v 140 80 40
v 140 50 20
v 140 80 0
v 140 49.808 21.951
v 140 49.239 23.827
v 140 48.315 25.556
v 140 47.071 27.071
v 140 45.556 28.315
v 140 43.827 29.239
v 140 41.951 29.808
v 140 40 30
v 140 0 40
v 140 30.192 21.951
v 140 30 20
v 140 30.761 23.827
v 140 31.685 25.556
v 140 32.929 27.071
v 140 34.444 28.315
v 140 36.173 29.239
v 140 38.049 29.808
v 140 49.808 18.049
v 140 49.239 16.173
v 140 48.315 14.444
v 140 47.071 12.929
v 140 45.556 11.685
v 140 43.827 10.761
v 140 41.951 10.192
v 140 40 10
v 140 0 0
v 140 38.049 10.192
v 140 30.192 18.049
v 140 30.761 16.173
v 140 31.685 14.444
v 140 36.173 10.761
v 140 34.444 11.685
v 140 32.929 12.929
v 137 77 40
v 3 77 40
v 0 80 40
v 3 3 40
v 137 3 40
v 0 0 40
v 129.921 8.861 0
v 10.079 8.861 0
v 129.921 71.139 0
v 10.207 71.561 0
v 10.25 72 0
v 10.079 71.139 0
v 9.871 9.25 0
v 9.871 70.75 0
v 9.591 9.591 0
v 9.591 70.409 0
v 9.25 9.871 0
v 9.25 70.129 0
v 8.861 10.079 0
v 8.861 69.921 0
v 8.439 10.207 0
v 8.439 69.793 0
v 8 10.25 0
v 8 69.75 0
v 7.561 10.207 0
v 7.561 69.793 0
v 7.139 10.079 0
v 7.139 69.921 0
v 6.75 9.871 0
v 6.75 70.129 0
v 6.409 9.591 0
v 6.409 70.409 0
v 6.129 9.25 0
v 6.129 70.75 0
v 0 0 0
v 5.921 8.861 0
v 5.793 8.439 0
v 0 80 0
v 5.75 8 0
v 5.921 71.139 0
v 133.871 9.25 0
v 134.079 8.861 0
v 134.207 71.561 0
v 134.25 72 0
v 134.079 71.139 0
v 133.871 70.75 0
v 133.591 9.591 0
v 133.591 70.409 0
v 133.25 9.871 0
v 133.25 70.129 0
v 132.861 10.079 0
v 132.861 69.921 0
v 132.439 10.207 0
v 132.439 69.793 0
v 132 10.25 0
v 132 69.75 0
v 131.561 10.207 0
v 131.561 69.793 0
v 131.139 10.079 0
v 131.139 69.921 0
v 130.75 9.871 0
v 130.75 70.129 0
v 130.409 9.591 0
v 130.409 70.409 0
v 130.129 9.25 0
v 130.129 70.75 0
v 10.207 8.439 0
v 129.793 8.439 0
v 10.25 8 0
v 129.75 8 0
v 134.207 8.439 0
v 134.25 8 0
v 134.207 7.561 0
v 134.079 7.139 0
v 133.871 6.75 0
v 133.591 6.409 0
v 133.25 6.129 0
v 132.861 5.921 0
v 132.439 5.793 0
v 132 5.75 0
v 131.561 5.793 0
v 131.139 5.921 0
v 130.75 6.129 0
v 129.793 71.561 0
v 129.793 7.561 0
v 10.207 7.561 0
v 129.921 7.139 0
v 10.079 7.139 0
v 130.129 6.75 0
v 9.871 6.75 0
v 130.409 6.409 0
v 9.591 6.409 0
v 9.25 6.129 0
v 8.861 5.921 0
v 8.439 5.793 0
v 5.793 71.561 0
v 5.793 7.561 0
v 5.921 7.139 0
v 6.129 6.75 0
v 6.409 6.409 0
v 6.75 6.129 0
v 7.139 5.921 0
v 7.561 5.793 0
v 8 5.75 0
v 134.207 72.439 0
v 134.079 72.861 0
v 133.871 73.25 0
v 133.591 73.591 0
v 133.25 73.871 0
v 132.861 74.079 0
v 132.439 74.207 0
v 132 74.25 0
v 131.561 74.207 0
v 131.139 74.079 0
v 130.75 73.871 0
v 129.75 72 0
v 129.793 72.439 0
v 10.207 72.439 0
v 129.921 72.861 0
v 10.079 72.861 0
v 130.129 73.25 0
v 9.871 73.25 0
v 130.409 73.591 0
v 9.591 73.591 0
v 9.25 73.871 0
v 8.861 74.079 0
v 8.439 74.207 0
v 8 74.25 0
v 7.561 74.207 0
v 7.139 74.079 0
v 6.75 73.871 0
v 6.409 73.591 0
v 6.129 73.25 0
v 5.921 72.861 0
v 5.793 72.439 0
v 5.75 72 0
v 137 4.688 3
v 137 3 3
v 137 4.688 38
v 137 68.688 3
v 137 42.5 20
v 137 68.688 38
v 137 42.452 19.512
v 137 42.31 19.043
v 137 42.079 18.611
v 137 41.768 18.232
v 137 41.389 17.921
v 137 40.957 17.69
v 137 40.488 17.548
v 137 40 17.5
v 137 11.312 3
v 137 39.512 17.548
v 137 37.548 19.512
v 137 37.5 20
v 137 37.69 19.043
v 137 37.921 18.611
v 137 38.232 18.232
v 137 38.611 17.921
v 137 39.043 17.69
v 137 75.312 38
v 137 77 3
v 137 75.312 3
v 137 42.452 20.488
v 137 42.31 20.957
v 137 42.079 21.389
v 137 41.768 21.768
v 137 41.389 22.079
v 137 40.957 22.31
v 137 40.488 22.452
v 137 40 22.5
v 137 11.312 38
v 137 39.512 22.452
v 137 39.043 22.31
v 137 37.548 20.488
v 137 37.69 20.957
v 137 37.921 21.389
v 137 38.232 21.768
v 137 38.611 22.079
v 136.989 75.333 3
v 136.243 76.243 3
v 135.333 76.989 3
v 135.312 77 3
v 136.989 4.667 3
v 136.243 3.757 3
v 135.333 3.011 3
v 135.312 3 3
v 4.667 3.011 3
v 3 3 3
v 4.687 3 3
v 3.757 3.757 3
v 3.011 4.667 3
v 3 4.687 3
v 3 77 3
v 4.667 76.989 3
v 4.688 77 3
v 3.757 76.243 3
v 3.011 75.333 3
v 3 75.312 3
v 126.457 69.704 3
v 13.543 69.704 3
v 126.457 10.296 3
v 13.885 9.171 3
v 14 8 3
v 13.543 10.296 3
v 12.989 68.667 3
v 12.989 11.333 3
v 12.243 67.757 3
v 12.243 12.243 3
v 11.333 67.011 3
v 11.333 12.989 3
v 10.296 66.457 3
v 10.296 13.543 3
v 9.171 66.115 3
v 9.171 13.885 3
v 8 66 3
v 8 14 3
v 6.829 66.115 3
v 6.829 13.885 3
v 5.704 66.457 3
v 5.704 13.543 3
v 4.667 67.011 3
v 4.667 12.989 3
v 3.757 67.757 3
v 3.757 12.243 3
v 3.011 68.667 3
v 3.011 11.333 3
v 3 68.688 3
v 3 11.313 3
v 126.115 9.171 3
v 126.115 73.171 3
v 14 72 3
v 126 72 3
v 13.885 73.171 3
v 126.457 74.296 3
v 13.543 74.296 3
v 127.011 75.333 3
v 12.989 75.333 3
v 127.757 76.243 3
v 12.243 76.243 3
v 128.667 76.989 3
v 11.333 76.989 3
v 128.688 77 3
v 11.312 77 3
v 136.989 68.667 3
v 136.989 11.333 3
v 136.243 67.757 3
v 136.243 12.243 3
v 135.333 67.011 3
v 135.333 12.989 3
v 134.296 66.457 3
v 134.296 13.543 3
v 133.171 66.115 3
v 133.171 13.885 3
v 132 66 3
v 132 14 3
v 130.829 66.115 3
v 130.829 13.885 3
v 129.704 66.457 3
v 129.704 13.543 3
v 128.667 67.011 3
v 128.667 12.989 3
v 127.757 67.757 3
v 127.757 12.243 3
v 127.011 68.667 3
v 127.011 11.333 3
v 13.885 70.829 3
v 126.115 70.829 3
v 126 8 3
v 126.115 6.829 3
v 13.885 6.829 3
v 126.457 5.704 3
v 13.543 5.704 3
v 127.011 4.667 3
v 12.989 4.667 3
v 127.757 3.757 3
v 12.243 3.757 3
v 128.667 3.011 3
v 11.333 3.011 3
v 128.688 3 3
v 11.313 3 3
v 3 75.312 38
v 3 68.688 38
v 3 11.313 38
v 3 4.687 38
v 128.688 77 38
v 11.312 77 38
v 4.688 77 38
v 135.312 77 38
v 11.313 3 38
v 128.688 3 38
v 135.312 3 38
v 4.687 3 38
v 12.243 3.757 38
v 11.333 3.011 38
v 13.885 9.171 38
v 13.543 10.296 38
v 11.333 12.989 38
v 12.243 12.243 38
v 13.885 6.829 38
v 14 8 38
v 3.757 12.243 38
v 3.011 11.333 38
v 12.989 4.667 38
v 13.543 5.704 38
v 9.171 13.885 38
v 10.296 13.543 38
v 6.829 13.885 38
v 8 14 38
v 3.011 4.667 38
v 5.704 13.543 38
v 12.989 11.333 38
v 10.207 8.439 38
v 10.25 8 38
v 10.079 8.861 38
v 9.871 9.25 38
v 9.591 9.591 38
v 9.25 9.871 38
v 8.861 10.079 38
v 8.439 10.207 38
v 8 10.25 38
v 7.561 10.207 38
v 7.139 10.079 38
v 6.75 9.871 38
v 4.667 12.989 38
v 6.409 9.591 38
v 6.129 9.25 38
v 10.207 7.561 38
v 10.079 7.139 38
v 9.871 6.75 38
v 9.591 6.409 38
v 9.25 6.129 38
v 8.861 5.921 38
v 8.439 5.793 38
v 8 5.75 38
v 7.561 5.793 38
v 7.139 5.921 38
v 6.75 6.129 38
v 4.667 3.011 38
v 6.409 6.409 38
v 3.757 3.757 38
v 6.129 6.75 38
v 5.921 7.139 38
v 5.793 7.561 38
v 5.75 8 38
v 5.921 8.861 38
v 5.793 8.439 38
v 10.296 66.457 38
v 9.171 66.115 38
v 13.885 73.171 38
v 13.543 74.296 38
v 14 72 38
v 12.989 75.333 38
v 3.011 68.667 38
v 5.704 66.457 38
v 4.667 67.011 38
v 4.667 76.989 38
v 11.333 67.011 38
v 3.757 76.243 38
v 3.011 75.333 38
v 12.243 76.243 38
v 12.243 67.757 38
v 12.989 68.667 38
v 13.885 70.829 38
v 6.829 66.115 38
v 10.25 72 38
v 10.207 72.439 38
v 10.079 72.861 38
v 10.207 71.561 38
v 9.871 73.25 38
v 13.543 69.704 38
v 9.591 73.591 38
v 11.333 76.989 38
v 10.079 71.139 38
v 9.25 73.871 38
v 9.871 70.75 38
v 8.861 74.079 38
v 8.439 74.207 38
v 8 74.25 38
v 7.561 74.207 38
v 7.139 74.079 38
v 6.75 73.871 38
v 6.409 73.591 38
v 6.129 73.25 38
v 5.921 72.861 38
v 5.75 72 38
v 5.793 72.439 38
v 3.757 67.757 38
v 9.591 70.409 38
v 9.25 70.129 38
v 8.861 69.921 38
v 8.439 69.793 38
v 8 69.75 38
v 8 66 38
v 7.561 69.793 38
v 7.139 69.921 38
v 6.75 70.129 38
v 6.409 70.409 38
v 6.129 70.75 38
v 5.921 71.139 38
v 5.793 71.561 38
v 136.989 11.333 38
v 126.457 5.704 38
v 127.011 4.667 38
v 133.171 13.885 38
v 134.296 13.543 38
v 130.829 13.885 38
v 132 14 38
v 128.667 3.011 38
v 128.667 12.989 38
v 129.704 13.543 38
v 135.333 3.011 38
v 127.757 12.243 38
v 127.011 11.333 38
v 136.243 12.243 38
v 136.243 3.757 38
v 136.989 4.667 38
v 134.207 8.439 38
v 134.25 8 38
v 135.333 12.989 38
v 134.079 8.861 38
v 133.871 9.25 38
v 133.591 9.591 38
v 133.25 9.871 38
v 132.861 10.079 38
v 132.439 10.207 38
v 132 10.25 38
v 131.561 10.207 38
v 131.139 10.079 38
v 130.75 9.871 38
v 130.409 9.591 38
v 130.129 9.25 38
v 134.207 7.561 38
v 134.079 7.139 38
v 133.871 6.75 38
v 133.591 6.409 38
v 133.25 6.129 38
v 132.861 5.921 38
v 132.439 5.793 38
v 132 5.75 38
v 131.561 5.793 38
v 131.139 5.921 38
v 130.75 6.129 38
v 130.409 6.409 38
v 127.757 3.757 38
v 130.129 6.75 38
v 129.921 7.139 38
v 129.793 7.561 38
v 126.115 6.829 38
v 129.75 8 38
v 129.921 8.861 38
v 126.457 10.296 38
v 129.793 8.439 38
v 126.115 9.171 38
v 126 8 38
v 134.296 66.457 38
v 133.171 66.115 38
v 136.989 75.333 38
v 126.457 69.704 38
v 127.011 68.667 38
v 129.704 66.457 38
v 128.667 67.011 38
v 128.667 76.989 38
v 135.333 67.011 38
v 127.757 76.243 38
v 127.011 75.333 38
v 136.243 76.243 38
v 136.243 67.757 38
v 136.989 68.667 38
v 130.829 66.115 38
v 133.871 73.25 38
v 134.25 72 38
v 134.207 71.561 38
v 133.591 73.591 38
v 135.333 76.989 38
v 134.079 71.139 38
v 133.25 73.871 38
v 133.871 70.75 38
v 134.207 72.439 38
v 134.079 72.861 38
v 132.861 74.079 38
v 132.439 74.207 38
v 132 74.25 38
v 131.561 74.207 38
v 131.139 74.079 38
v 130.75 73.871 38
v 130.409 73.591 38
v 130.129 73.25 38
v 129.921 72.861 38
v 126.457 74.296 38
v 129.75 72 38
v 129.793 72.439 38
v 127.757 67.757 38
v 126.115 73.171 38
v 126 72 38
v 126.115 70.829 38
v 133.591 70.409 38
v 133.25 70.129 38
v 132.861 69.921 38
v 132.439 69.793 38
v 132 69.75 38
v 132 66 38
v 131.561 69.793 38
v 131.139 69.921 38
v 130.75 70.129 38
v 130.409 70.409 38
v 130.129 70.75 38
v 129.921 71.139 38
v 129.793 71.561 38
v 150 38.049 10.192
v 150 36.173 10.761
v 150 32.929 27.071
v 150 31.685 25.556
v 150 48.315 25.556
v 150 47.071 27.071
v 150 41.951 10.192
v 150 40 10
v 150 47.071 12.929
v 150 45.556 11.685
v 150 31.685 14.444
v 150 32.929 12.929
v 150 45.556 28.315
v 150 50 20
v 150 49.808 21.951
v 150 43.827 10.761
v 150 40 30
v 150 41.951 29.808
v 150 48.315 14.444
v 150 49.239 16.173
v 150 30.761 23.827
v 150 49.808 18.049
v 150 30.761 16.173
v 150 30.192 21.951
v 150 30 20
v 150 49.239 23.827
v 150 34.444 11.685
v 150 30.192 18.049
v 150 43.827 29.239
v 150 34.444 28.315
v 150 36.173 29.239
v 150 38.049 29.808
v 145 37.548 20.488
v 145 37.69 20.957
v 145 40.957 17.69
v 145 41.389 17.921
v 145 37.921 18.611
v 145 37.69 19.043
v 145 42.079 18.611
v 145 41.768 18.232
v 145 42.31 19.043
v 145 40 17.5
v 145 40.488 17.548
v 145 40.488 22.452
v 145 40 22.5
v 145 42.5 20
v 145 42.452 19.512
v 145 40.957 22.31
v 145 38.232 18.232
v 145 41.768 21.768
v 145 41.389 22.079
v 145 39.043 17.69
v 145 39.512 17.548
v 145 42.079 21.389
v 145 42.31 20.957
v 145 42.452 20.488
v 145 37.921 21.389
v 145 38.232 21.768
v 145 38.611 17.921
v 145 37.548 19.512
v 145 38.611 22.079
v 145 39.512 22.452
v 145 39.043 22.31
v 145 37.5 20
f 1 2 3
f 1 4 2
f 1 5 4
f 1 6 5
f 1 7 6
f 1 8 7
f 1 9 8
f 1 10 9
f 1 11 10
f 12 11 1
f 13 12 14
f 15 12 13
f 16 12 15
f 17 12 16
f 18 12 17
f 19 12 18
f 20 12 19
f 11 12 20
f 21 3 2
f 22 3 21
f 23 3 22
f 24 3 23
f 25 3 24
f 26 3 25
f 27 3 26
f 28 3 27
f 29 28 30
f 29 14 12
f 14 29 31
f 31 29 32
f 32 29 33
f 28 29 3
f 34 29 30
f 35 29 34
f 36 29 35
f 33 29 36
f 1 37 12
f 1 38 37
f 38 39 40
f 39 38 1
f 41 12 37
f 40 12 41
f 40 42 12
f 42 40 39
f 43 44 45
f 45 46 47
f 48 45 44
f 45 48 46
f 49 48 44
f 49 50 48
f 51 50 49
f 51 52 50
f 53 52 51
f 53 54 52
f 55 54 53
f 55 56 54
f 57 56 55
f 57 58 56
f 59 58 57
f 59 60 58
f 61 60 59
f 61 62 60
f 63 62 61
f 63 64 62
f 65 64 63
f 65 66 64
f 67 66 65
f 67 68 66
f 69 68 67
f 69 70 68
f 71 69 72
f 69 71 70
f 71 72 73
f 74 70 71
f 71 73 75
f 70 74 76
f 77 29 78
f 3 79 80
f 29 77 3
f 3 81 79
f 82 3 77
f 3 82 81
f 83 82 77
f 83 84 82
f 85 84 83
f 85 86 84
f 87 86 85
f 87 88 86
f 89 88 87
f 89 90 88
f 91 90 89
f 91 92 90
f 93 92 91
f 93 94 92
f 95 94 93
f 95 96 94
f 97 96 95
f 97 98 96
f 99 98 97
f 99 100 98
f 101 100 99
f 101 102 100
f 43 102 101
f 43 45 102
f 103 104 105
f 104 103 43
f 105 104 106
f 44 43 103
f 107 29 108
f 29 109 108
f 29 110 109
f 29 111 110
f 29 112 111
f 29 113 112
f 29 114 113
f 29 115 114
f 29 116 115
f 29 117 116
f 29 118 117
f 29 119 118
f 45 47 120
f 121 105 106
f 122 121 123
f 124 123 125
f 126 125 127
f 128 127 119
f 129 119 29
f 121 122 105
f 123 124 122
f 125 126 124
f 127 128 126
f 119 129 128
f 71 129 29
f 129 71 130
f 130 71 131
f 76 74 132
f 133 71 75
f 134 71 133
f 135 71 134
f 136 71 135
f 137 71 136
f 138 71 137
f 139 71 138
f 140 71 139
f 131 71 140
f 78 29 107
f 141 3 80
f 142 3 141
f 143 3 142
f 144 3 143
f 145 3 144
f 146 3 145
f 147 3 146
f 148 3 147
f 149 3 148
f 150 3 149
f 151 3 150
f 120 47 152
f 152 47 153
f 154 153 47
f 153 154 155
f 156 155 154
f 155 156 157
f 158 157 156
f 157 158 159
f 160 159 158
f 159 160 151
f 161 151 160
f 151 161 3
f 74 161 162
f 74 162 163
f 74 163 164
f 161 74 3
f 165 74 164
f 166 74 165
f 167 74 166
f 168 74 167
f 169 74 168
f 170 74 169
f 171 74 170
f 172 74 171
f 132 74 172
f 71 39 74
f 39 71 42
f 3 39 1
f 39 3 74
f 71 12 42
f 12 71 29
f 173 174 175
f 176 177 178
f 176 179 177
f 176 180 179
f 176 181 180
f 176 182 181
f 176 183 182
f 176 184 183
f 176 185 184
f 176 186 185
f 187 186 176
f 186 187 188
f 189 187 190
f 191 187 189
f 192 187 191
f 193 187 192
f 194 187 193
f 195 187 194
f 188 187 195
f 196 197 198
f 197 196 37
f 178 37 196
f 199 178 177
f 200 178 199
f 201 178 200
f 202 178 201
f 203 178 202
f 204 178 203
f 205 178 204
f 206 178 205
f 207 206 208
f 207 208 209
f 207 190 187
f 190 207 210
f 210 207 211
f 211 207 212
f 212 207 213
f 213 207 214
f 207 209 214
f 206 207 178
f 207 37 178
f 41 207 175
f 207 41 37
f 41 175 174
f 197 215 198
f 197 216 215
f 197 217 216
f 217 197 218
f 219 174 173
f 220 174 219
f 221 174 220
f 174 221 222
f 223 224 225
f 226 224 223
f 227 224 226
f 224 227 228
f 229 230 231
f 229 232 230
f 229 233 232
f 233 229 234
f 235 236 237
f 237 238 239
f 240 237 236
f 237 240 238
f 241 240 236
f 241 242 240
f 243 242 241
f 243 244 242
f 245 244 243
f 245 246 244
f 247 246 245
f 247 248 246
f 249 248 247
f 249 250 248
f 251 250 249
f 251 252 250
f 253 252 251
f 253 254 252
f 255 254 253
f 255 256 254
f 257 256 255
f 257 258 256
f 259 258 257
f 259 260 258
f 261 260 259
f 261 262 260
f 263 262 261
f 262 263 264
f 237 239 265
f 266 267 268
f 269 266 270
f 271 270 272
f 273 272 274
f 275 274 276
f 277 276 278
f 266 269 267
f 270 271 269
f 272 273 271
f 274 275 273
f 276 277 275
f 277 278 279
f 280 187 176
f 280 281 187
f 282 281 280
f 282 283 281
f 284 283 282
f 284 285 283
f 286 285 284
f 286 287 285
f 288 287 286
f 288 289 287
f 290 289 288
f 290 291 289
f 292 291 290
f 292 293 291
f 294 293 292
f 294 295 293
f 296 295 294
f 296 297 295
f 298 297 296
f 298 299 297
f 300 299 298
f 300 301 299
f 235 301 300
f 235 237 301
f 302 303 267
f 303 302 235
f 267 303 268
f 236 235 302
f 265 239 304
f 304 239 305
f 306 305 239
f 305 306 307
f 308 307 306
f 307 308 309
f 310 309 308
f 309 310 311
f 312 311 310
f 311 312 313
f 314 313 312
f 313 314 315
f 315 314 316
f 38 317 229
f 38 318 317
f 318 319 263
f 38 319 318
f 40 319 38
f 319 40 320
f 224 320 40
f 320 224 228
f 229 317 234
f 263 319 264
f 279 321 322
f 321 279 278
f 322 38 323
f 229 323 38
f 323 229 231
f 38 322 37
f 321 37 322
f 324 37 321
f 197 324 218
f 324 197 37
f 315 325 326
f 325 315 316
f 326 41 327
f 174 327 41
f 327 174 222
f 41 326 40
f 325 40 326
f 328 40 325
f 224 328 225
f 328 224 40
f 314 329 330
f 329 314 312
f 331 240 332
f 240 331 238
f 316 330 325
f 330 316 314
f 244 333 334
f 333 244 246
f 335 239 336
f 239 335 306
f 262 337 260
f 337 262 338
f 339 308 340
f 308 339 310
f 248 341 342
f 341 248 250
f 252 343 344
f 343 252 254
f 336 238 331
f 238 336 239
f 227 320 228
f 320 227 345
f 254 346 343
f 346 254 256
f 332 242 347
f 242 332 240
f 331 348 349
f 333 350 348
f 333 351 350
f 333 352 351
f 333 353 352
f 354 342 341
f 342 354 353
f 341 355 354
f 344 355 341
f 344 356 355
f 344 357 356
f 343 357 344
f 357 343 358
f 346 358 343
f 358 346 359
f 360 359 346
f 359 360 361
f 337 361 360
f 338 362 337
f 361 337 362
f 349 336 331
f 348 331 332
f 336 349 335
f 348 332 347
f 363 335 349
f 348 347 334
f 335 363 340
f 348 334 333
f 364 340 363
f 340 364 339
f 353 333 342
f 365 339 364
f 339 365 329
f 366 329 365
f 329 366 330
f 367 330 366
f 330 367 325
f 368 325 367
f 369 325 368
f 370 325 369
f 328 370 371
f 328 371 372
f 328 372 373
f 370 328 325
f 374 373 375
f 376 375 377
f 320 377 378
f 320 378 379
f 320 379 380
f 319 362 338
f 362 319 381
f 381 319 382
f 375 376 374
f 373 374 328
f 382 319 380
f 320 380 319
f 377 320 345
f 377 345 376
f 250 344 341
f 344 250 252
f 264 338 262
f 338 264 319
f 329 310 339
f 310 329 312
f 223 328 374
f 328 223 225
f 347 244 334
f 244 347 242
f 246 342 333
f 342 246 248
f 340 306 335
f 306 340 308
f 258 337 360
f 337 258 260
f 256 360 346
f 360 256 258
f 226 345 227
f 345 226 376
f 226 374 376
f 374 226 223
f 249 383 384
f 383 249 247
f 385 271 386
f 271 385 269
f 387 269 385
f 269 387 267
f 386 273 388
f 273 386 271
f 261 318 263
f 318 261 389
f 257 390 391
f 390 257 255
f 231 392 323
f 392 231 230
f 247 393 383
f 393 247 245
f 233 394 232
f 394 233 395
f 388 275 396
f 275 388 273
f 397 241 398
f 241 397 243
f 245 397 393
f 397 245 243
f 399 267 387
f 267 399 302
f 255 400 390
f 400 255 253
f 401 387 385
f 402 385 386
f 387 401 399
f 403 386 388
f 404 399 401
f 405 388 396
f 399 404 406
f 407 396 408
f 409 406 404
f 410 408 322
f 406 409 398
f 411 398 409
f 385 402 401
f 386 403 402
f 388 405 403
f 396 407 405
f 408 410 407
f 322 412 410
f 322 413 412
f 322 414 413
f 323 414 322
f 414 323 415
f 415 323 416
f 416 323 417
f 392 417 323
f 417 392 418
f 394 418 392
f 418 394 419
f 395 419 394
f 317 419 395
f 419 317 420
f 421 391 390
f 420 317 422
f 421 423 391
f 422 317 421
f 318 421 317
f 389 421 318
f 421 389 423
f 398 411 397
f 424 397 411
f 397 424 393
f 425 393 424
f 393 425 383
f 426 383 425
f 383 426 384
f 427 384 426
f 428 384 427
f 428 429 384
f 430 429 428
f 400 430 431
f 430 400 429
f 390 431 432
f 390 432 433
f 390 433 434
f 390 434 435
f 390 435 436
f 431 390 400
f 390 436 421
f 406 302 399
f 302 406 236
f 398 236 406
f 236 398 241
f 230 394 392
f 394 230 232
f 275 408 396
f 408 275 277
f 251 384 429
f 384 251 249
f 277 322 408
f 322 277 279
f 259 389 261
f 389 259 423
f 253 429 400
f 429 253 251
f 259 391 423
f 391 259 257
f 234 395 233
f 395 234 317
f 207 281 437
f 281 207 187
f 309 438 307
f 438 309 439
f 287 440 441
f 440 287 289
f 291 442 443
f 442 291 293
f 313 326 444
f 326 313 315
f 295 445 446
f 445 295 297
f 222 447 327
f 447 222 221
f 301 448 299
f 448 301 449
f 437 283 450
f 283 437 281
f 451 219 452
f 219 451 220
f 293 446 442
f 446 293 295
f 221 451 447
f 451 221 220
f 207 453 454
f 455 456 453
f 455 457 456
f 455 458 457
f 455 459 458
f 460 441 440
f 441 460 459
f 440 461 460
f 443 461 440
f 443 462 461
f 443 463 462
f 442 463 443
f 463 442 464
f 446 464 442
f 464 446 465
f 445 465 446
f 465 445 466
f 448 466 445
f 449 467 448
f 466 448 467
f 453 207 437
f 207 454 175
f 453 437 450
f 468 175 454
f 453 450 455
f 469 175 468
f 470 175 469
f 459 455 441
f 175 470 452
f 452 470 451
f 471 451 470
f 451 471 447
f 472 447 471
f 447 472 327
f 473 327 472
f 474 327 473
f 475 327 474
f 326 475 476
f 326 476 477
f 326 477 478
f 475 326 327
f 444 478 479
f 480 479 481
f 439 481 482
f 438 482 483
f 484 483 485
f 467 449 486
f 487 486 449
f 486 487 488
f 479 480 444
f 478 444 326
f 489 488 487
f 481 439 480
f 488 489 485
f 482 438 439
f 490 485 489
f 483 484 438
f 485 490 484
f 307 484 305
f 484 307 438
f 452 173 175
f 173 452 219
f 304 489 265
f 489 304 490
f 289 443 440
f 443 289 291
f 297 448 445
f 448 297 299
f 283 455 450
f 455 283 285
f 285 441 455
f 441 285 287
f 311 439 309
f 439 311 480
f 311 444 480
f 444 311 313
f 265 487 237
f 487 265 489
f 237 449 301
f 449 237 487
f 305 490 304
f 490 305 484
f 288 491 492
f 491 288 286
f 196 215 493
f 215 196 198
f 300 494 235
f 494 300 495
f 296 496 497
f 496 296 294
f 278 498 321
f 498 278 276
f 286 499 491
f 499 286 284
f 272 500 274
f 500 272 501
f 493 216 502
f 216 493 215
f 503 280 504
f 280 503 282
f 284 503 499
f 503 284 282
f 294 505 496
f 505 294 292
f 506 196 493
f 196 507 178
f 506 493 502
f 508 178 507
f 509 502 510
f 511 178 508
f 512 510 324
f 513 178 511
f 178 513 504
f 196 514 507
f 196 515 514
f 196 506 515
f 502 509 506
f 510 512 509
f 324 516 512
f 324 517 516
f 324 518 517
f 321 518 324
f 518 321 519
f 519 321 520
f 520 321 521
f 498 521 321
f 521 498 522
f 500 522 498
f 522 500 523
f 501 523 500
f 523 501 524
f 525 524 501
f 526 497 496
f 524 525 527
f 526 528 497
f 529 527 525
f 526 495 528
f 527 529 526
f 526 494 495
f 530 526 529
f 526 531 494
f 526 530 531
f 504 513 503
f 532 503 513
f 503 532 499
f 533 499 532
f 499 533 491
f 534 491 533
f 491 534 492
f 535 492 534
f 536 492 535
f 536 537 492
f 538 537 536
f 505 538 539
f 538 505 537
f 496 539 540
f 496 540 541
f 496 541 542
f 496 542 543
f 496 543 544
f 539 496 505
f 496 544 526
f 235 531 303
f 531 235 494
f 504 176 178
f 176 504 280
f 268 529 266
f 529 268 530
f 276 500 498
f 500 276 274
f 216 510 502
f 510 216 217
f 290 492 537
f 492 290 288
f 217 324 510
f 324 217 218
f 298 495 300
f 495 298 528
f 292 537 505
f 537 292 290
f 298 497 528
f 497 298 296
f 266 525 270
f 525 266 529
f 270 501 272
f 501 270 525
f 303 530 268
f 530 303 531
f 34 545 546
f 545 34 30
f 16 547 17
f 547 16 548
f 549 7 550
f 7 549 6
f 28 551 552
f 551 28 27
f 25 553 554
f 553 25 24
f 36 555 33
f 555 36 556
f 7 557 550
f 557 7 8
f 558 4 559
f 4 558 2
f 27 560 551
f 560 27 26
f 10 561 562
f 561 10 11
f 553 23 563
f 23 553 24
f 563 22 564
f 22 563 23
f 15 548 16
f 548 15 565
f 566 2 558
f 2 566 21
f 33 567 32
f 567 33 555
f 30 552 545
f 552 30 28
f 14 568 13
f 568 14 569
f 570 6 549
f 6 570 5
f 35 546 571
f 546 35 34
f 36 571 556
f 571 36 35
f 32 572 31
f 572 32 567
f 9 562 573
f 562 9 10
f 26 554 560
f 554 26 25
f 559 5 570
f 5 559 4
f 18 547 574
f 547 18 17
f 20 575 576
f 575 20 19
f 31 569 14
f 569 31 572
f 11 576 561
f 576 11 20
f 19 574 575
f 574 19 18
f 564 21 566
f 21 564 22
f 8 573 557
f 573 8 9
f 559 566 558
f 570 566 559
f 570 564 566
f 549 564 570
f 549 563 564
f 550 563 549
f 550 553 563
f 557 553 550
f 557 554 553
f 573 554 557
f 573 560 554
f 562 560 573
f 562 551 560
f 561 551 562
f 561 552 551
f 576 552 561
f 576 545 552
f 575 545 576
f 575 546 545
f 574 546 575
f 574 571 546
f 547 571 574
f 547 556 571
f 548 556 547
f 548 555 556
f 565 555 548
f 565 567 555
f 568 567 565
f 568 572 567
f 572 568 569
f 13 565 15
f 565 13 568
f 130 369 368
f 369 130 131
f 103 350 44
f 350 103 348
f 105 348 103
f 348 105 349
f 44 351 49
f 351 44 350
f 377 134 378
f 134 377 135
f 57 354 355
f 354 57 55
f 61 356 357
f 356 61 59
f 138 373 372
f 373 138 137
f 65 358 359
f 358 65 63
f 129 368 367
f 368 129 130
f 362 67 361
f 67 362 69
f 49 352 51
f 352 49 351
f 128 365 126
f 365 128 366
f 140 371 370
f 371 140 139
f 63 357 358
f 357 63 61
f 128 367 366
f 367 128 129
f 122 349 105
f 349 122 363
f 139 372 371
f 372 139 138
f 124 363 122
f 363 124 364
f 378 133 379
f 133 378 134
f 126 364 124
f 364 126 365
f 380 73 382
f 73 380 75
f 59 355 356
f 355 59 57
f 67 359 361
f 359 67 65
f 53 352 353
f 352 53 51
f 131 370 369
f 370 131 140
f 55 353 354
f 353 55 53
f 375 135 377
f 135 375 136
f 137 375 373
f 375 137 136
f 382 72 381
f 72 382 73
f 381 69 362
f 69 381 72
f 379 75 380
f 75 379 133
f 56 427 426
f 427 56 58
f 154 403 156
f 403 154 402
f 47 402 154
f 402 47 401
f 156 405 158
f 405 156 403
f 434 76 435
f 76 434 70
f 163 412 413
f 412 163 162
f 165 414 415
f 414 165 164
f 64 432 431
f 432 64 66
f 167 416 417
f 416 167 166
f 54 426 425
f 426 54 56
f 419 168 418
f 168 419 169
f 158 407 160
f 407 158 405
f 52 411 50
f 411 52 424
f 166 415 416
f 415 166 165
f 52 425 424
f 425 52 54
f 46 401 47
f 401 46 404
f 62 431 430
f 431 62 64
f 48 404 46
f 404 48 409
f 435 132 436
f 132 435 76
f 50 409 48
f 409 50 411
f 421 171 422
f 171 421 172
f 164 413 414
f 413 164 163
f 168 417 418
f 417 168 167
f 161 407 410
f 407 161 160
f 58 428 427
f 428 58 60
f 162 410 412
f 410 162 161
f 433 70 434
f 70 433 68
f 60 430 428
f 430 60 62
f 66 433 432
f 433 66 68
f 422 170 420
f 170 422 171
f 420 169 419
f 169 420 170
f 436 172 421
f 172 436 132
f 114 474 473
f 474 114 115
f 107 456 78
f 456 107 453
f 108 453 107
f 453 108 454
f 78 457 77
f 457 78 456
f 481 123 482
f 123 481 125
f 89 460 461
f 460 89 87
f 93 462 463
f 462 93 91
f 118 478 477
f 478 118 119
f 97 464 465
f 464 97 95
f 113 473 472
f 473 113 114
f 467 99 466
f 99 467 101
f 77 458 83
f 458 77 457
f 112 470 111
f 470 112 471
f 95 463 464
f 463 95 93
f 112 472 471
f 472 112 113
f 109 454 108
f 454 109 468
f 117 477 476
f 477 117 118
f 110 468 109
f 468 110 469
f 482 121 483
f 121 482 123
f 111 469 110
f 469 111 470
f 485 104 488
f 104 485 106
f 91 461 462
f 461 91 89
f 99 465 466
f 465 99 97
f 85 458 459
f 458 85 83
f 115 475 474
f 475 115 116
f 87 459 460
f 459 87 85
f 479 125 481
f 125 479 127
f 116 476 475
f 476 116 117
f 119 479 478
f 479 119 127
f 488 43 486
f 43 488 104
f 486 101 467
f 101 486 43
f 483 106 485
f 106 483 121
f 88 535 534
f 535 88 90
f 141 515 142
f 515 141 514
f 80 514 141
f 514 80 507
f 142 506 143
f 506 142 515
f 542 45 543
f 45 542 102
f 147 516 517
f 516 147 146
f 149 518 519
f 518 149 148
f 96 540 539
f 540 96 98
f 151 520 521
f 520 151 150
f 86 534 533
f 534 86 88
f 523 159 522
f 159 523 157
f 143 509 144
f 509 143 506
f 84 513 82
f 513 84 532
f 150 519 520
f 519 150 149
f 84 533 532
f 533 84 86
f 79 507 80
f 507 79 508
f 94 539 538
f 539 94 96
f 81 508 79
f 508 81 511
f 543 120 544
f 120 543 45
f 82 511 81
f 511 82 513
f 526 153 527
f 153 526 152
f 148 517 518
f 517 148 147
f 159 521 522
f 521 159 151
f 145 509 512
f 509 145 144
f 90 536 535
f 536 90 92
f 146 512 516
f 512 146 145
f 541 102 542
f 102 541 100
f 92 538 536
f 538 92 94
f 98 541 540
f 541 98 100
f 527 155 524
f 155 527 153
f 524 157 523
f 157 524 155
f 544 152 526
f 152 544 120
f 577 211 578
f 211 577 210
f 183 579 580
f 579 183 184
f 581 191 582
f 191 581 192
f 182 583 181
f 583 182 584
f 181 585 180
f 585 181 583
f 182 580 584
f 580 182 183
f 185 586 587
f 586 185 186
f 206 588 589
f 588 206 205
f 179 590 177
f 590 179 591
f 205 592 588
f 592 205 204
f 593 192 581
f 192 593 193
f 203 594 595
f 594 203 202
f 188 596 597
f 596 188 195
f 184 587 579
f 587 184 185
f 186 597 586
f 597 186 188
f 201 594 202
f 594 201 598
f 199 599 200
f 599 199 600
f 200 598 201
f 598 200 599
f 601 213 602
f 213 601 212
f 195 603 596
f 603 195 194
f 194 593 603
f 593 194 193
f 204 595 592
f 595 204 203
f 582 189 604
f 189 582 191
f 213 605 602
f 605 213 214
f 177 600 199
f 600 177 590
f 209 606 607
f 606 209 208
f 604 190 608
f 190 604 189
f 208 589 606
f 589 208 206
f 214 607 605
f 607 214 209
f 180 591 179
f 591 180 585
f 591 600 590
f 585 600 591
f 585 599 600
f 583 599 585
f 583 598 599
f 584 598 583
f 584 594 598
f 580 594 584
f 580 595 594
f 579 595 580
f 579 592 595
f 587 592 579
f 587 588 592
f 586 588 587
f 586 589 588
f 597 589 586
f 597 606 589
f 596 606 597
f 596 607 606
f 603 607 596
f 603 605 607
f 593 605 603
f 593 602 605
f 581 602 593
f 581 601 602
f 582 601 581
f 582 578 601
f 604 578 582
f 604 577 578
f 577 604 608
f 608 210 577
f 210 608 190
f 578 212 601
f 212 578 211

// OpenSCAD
$fn = 32;

// ----------------------------------------------------------------------
// Enclosure body: 140 x 80 x 40 mm, wall 3 mm
// ----------------------------------------------------------------------

// --- parameters (mm) ---
length = 140;             // outside length, X
width = 80;               // outside width, Y
height = 40;              // outside height, Z
wall = 3;                 // side wall thickness
floor_t = 3;              // floor thickness
boss_d = 12;              // corner boss diameter
boss_h = 35;              // corner boss height above the floor
boss_hole_d = 4.5;        // lid screw clearance in the boss
boss_lip = 8;             // boss centre inset from the corner
nipple_d = 20;            // cable gland boss diameter
nipple_h = 10;            // cable gland boss height
nipple_bore = 5;          // cable gland bore

module shell() {
  difference() {
    cube([length, width, height]);
    /* hollow, open at the top */
    translate([wall, wall, floor_t])
      cube([length - 2 * wall, width - 2 * wall, height]);
  }
}

module bosses() {
  /* corner bosses, sunk 1 mm into the floor */
  for (sx = [0, 1]) for (sy = [0, 1])
    translate([sx * (length - 2 * boss_lip) + boss_lip, sy * (width - 2 * boss_lip) + boss_lip, floor_t - 1])
      cylinder(h = boss_h + 1, d = boss_d);
}

module gland() {
  /* boss on the short wall, sunk 1 mm into it */
  translate([length - 1, width / 2, height * 0.5]) rotate([0, 90, 0])
    cylinder(h = nipple_h + 1, d = nipple_d);
}

difference() {
  union() {
    shell();
    bosses();
    gland();
  }
  /* boss screw holes */
  for (sx = [0, 1]) for (sy = [0, 1])
    translate([sx * (length - 2 * boss_lip) + boss_lip, sy * (width - 2 * boss_lip) + boss_lip, -1]) cylinder(h = floor_t + boss_h + 2, d = boss_hole_d);
  translate([length, width / 2, height * 0.5]) rotate([0, 90, 0]) translate([0, 0, -nipple_h - 2]) cylinder(h = nipple_h + wall + 4, d = nipple_bore);
}
